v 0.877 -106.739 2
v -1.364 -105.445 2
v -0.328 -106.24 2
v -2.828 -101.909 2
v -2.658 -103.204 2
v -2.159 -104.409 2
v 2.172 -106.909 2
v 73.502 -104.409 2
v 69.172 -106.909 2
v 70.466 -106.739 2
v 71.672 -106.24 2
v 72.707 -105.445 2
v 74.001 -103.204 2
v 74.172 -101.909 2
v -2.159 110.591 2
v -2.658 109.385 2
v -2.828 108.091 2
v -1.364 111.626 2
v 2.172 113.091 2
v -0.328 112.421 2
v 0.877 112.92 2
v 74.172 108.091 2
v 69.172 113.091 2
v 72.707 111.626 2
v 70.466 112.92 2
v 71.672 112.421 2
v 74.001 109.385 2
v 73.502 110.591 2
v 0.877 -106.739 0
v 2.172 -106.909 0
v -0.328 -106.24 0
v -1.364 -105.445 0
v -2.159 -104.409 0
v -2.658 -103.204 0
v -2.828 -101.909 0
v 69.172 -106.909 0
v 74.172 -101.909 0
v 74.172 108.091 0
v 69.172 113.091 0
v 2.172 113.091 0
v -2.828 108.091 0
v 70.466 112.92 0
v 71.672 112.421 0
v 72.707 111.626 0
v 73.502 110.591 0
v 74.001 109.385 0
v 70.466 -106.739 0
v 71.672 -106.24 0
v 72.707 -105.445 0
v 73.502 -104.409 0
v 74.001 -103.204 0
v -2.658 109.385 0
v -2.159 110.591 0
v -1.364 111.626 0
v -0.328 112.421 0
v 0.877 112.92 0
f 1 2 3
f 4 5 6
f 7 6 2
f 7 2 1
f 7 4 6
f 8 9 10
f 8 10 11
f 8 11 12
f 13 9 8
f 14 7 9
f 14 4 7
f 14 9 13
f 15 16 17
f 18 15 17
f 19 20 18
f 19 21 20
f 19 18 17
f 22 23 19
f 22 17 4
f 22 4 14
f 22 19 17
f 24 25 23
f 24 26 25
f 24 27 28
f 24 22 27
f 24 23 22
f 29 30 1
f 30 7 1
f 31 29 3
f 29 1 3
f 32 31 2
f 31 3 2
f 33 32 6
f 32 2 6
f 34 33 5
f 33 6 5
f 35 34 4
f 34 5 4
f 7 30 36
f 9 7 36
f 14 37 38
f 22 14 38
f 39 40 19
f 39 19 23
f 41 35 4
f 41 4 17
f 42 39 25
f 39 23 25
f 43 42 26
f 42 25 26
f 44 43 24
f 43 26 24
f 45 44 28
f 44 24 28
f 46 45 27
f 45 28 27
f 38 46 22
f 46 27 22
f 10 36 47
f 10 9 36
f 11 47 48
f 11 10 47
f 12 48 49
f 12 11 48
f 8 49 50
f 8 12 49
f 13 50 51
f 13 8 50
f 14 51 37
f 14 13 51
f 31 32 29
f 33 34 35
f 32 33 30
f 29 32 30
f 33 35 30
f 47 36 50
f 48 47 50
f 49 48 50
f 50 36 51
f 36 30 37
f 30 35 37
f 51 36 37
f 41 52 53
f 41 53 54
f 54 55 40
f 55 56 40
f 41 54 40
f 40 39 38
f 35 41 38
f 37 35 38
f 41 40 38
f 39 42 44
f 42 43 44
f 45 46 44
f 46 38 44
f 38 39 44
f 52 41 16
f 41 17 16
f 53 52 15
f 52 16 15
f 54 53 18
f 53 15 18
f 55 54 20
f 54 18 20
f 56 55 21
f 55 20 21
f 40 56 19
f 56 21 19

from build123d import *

# Parameters (mm, degrees)
SKETCH_W    = 77
SKETCH_H    = 220
PAD_DEPTH   = 2
FILLET_R    = 5
FILLET001_R = 5
FILLET002_R = 5
FILLET003_R = 5


with BuildPart() as part:
    # Sketch → Pad (new body)
    with BuildSketch(Plane.XY):
        with Locations((35.671573, 3.090588)):
            Rectangle(SKETCH_W, SKETCH_H)
    extrude(amount=PAD_DEPTH)

    # Fillet
    fillet_edges = [part.edges().sort_by_distance(p)[0] for p in [
        (74.171573, -106.909412, 1),
    ]]
    fillet(fillet_edges, radius=FILLET_R)

    # Fillet001
    fillet001_edges = [part.edges().sort_by_distance(p)[0] for p in [
        (-2.828427, -106.909412, 1),
    ]]
    fillet(fillet001_edges, radius=FILLET001_R)

    # Fillet002
    fillet002_edges = [part.edges().sort_by_distance(p)[0] for p in [
        (-2.828427, 113.090588, 1),
    ]]
    fillet(fillet002_edges, radius=FILLET002_R)

    # Fillet003
    fillet003_edges = [part.edges().sort_by_distance(p)[0] for p in [
        (74.171573, 113.090588, 1),
    ]]
    fillet(fillet003_edges, radius=FILLET003_R)


solid = part.part
